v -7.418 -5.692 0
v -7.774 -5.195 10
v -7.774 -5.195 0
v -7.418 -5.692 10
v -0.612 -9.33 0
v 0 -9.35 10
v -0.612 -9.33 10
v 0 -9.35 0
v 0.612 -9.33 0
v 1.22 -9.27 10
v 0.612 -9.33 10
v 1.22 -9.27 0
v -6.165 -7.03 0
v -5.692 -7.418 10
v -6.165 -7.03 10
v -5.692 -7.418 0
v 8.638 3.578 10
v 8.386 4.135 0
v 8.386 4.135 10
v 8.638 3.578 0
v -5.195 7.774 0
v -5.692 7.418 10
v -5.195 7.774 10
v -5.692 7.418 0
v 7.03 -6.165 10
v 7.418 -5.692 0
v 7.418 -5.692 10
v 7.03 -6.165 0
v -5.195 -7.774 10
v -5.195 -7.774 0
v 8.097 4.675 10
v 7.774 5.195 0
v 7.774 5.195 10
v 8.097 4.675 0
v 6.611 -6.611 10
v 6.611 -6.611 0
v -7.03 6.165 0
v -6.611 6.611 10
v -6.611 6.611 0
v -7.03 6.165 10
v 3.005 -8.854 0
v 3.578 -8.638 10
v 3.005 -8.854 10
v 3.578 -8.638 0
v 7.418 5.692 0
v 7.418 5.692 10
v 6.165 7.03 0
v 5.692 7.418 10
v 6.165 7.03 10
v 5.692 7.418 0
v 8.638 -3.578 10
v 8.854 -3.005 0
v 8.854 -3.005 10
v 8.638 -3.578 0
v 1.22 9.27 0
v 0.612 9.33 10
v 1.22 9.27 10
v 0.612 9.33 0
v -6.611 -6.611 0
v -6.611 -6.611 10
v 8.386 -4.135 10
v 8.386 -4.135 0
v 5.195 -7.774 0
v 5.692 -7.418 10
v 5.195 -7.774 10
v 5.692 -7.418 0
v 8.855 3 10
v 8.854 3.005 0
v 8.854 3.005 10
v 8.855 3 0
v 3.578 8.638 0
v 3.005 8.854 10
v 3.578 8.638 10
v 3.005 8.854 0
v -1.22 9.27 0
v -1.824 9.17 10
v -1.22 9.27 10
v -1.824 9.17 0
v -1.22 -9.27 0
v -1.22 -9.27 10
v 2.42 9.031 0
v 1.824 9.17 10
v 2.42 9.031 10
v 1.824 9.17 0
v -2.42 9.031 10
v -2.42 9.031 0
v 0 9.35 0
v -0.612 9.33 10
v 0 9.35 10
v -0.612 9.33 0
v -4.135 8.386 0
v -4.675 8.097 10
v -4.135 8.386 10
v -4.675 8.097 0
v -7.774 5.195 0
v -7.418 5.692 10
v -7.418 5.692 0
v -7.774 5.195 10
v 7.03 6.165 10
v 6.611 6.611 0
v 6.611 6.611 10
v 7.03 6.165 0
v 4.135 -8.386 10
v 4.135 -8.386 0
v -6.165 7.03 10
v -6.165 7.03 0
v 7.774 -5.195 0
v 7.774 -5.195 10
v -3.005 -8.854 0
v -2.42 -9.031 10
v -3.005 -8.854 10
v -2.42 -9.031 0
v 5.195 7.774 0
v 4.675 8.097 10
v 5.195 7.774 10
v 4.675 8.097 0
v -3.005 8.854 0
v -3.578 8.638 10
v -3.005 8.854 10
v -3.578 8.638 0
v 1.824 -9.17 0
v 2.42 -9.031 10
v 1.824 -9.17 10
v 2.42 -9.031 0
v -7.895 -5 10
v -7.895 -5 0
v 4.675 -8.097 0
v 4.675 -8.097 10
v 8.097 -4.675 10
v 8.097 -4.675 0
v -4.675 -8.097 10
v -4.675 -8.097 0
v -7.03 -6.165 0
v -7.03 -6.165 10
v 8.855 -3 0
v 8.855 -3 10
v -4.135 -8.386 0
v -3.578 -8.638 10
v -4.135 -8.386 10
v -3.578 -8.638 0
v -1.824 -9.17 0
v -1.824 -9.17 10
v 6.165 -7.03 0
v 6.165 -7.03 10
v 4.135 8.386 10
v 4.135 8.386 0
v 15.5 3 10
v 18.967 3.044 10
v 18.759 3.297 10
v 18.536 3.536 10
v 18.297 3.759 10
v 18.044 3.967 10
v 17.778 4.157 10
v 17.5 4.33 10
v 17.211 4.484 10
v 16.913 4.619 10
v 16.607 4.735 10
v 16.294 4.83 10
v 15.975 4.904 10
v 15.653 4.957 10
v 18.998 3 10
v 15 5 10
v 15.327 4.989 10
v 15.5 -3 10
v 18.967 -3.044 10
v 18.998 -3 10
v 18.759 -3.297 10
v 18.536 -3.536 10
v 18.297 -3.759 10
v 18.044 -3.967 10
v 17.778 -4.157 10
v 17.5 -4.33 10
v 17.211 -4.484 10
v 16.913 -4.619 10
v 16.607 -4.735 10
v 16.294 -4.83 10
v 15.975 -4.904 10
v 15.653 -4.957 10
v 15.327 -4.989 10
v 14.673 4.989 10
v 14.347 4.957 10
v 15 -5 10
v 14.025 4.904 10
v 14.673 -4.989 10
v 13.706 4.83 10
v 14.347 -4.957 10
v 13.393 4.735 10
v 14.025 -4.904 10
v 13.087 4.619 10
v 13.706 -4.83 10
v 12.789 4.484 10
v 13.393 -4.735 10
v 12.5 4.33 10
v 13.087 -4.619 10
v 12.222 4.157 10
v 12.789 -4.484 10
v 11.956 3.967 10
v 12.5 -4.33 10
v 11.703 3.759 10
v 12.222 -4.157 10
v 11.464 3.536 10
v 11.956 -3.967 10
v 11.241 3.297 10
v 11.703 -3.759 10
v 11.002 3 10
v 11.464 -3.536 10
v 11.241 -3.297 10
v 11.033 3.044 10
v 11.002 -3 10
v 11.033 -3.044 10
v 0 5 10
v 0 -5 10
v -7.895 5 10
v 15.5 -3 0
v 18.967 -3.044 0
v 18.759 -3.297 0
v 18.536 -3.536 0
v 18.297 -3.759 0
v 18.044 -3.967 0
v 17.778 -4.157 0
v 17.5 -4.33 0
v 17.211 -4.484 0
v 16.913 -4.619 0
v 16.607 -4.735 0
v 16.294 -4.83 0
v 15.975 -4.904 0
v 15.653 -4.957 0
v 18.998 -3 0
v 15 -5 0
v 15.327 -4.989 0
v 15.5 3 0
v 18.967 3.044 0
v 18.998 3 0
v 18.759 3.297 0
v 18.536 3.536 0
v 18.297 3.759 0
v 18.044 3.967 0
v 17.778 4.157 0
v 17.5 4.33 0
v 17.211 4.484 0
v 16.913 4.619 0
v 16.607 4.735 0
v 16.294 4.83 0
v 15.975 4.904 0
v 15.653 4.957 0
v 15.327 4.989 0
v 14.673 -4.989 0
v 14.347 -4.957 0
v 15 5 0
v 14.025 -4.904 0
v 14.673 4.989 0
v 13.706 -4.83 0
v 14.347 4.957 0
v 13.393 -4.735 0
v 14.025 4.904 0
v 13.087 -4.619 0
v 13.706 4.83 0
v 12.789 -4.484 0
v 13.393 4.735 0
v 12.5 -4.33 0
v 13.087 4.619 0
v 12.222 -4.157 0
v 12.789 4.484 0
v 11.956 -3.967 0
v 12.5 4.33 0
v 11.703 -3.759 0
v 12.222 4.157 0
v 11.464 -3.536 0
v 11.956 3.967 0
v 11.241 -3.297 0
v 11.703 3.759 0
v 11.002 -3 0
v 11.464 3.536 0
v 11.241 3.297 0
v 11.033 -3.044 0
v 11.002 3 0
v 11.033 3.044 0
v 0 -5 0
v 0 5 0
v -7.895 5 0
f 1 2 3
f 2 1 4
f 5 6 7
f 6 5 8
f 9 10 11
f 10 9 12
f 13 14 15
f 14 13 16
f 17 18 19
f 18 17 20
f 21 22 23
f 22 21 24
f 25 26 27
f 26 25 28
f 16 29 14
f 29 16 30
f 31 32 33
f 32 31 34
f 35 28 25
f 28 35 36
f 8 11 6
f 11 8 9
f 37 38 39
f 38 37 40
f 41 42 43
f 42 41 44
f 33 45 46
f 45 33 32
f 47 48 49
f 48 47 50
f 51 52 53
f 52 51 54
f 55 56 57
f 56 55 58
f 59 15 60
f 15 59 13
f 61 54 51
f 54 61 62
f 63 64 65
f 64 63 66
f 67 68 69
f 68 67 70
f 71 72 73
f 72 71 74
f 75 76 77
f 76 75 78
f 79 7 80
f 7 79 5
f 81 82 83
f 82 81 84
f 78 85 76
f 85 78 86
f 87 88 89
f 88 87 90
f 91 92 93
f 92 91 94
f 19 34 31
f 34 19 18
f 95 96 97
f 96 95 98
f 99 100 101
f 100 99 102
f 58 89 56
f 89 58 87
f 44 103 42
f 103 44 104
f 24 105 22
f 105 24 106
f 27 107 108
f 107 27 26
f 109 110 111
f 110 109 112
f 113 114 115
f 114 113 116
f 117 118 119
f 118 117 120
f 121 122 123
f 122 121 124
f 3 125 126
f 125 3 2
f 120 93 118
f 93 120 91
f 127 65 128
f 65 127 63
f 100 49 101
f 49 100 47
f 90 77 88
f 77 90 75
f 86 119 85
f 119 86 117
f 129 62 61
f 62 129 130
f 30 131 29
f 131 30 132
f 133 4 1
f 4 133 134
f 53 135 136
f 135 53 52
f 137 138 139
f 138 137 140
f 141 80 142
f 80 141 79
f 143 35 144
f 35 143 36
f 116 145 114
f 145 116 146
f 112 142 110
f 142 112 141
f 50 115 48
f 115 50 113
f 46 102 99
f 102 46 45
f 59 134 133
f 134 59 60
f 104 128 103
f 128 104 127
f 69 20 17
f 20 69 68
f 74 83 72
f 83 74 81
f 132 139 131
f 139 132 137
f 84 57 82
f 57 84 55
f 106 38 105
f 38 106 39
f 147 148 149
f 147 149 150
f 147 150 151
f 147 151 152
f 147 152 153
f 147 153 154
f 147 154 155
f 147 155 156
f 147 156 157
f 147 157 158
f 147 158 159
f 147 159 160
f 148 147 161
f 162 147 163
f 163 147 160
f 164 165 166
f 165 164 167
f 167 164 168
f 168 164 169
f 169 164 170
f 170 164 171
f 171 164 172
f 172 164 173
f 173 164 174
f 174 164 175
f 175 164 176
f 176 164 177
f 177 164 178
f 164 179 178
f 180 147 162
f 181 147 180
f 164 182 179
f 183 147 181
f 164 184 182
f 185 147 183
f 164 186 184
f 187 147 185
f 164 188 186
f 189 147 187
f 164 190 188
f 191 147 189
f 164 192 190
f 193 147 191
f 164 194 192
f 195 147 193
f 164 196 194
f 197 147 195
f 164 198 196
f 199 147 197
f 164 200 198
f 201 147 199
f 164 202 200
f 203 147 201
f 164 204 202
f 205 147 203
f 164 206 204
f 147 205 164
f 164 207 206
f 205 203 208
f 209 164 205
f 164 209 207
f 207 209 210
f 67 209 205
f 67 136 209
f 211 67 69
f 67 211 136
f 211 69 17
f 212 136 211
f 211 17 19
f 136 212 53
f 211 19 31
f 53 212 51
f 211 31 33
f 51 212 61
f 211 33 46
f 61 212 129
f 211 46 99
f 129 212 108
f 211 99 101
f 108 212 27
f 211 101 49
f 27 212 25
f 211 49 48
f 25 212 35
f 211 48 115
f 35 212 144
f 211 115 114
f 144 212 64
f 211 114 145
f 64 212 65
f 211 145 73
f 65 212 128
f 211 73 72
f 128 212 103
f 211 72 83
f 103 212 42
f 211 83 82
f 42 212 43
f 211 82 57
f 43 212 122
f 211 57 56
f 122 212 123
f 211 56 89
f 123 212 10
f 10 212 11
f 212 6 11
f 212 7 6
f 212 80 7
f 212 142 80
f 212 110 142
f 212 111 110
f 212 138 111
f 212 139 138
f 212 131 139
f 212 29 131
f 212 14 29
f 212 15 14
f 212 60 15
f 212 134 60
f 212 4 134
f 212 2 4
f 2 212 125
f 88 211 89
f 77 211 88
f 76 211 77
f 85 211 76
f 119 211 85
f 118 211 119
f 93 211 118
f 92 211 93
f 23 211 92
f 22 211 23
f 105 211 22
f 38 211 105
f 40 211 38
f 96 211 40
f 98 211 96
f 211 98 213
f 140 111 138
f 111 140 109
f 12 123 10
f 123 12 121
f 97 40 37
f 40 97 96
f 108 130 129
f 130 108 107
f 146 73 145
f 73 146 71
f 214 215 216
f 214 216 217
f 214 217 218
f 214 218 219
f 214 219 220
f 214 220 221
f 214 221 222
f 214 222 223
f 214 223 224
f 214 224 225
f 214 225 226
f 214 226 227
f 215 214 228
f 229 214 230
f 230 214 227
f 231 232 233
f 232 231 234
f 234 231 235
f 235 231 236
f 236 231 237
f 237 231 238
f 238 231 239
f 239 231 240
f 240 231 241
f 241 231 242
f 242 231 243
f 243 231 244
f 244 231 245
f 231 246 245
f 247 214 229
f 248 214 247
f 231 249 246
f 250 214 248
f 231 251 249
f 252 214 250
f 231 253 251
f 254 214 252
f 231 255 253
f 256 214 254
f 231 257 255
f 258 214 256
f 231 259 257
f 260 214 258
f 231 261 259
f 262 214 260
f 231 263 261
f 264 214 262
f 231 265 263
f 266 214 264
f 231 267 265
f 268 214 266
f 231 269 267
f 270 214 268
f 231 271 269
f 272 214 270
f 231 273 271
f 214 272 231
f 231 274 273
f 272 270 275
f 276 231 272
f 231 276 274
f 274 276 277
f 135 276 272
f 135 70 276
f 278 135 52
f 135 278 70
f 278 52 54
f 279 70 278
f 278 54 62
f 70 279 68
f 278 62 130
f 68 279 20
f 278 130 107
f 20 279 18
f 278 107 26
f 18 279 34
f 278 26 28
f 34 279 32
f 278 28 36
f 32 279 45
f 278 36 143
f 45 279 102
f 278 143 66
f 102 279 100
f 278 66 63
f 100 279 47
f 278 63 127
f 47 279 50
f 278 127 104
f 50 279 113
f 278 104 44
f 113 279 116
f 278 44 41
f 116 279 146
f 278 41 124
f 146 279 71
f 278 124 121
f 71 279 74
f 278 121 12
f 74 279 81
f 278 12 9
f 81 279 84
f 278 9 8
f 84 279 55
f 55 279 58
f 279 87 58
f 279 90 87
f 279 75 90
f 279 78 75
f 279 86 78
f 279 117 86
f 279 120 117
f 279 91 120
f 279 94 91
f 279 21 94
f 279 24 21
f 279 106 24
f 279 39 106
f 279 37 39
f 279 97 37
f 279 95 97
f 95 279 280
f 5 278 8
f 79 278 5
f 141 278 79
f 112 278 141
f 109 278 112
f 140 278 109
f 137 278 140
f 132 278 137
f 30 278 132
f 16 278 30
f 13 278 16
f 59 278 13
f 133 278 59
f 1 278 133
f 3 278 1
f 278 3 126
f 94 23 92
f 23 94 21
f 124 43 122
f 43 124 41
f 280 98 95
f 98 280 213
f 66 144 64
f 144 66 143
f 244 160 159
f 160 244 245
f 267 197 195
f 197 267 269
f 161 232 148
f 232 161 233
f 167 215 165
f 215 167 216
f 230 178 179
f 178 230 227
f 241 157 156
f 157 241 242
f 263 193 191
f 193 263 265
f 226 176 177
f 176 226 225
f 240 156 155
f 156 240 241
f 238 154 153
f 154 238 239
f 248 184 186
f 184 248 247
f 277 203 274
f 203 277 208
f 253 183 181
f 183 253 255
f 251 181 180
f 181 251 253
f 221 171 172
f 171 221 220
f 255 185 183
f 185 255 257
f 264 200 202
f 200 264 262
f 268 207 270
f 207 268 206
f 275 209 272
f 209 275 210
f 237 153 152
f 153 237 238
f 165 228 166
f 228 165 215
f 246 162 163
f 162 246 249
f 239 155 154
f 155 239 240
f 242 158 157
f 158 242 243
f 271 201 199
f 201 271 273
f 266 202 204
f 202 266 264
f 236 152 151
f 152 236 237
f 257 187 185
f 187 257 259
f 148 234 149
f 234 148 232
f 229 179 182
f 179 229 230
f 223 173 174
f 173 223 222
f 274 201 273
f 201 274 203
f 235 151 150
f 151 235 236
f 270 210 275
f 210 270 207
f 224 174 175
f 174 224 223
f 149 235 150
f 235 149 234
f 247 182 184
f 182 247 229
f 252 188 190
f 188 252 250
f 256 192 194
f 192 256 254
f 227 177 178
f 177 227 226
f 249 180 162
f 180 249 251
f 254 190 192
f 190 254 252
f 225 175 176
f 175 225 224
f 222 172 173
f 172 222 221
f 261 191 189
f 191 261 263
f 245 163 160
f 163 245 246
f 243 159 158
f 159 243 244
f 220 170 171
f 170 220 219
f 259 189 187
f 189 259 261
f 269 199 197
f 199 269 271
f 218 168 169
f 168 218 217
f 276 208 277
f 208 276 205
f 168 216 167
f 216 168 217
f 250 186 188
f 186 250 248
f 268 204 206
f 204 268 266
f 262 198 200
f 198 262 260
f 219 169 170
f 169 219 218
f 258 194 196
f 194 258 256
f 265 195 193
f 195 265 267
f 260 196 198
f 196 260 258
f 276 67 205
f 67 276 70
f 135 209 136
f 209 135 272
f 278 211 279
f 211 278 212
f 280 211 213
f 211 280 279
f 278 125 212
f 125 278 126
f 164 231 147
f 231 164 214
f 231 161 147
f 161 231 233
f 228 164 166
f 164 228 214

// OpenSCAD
// Snap-on tubing clip for a 12.7 mm lab stand rod
// Print orientation: flat on the bed, extrusion builds up in +Z

$fn = 96;

// ---- Dimensions (mm) ----
rod_d      = 12.7;   // stand rod diameter
ring_w     = 3;      // rod ring wall thickness
rod_r      = rod_d / 2 + ring_w;  // rod ring outer radius (18.7/2 = 9.35)
opening    = 10;     // rod ring opening width along -X
bracket_r  = 6 / 2 + 2;           // tubing ring outer radius (2 mm wall)
bracket_x  = 15;     // tubing ring centre X
bridge_w   = 6;      // bridge width in Y
bridge_x0  = 8;      // bridge start X
bridge_x1  = 12;     // bridge end X
eps        = 0.5;    // cutter overshoot past faces

// ---- Model ----
difference() {
    union() {
        // Rod ring
        cylinder(r = rod_r, h = 10);
        // Tubing ring
        translate([bracket_x, 0, 0])
            cylinder(r = bracket_r, h = 10);
        // Bridge between the rings
        translate([bridge_x0, -bridge_w / 2, 0])
            cube([bridge_x1 - bridge_x0, bridge_w, 10]);
    }
    // Rod ring opening (-X side)
    translate([-rod_r - eps, -opening / 2, 0])
        cube([rod_r + eps, opening, 10]);
    // Tubing ring opening (+X side)
    translate([bracket_x + eps, -6 / 2, 0])
        cube([bracket_r + eps, 6, 10]);
}
